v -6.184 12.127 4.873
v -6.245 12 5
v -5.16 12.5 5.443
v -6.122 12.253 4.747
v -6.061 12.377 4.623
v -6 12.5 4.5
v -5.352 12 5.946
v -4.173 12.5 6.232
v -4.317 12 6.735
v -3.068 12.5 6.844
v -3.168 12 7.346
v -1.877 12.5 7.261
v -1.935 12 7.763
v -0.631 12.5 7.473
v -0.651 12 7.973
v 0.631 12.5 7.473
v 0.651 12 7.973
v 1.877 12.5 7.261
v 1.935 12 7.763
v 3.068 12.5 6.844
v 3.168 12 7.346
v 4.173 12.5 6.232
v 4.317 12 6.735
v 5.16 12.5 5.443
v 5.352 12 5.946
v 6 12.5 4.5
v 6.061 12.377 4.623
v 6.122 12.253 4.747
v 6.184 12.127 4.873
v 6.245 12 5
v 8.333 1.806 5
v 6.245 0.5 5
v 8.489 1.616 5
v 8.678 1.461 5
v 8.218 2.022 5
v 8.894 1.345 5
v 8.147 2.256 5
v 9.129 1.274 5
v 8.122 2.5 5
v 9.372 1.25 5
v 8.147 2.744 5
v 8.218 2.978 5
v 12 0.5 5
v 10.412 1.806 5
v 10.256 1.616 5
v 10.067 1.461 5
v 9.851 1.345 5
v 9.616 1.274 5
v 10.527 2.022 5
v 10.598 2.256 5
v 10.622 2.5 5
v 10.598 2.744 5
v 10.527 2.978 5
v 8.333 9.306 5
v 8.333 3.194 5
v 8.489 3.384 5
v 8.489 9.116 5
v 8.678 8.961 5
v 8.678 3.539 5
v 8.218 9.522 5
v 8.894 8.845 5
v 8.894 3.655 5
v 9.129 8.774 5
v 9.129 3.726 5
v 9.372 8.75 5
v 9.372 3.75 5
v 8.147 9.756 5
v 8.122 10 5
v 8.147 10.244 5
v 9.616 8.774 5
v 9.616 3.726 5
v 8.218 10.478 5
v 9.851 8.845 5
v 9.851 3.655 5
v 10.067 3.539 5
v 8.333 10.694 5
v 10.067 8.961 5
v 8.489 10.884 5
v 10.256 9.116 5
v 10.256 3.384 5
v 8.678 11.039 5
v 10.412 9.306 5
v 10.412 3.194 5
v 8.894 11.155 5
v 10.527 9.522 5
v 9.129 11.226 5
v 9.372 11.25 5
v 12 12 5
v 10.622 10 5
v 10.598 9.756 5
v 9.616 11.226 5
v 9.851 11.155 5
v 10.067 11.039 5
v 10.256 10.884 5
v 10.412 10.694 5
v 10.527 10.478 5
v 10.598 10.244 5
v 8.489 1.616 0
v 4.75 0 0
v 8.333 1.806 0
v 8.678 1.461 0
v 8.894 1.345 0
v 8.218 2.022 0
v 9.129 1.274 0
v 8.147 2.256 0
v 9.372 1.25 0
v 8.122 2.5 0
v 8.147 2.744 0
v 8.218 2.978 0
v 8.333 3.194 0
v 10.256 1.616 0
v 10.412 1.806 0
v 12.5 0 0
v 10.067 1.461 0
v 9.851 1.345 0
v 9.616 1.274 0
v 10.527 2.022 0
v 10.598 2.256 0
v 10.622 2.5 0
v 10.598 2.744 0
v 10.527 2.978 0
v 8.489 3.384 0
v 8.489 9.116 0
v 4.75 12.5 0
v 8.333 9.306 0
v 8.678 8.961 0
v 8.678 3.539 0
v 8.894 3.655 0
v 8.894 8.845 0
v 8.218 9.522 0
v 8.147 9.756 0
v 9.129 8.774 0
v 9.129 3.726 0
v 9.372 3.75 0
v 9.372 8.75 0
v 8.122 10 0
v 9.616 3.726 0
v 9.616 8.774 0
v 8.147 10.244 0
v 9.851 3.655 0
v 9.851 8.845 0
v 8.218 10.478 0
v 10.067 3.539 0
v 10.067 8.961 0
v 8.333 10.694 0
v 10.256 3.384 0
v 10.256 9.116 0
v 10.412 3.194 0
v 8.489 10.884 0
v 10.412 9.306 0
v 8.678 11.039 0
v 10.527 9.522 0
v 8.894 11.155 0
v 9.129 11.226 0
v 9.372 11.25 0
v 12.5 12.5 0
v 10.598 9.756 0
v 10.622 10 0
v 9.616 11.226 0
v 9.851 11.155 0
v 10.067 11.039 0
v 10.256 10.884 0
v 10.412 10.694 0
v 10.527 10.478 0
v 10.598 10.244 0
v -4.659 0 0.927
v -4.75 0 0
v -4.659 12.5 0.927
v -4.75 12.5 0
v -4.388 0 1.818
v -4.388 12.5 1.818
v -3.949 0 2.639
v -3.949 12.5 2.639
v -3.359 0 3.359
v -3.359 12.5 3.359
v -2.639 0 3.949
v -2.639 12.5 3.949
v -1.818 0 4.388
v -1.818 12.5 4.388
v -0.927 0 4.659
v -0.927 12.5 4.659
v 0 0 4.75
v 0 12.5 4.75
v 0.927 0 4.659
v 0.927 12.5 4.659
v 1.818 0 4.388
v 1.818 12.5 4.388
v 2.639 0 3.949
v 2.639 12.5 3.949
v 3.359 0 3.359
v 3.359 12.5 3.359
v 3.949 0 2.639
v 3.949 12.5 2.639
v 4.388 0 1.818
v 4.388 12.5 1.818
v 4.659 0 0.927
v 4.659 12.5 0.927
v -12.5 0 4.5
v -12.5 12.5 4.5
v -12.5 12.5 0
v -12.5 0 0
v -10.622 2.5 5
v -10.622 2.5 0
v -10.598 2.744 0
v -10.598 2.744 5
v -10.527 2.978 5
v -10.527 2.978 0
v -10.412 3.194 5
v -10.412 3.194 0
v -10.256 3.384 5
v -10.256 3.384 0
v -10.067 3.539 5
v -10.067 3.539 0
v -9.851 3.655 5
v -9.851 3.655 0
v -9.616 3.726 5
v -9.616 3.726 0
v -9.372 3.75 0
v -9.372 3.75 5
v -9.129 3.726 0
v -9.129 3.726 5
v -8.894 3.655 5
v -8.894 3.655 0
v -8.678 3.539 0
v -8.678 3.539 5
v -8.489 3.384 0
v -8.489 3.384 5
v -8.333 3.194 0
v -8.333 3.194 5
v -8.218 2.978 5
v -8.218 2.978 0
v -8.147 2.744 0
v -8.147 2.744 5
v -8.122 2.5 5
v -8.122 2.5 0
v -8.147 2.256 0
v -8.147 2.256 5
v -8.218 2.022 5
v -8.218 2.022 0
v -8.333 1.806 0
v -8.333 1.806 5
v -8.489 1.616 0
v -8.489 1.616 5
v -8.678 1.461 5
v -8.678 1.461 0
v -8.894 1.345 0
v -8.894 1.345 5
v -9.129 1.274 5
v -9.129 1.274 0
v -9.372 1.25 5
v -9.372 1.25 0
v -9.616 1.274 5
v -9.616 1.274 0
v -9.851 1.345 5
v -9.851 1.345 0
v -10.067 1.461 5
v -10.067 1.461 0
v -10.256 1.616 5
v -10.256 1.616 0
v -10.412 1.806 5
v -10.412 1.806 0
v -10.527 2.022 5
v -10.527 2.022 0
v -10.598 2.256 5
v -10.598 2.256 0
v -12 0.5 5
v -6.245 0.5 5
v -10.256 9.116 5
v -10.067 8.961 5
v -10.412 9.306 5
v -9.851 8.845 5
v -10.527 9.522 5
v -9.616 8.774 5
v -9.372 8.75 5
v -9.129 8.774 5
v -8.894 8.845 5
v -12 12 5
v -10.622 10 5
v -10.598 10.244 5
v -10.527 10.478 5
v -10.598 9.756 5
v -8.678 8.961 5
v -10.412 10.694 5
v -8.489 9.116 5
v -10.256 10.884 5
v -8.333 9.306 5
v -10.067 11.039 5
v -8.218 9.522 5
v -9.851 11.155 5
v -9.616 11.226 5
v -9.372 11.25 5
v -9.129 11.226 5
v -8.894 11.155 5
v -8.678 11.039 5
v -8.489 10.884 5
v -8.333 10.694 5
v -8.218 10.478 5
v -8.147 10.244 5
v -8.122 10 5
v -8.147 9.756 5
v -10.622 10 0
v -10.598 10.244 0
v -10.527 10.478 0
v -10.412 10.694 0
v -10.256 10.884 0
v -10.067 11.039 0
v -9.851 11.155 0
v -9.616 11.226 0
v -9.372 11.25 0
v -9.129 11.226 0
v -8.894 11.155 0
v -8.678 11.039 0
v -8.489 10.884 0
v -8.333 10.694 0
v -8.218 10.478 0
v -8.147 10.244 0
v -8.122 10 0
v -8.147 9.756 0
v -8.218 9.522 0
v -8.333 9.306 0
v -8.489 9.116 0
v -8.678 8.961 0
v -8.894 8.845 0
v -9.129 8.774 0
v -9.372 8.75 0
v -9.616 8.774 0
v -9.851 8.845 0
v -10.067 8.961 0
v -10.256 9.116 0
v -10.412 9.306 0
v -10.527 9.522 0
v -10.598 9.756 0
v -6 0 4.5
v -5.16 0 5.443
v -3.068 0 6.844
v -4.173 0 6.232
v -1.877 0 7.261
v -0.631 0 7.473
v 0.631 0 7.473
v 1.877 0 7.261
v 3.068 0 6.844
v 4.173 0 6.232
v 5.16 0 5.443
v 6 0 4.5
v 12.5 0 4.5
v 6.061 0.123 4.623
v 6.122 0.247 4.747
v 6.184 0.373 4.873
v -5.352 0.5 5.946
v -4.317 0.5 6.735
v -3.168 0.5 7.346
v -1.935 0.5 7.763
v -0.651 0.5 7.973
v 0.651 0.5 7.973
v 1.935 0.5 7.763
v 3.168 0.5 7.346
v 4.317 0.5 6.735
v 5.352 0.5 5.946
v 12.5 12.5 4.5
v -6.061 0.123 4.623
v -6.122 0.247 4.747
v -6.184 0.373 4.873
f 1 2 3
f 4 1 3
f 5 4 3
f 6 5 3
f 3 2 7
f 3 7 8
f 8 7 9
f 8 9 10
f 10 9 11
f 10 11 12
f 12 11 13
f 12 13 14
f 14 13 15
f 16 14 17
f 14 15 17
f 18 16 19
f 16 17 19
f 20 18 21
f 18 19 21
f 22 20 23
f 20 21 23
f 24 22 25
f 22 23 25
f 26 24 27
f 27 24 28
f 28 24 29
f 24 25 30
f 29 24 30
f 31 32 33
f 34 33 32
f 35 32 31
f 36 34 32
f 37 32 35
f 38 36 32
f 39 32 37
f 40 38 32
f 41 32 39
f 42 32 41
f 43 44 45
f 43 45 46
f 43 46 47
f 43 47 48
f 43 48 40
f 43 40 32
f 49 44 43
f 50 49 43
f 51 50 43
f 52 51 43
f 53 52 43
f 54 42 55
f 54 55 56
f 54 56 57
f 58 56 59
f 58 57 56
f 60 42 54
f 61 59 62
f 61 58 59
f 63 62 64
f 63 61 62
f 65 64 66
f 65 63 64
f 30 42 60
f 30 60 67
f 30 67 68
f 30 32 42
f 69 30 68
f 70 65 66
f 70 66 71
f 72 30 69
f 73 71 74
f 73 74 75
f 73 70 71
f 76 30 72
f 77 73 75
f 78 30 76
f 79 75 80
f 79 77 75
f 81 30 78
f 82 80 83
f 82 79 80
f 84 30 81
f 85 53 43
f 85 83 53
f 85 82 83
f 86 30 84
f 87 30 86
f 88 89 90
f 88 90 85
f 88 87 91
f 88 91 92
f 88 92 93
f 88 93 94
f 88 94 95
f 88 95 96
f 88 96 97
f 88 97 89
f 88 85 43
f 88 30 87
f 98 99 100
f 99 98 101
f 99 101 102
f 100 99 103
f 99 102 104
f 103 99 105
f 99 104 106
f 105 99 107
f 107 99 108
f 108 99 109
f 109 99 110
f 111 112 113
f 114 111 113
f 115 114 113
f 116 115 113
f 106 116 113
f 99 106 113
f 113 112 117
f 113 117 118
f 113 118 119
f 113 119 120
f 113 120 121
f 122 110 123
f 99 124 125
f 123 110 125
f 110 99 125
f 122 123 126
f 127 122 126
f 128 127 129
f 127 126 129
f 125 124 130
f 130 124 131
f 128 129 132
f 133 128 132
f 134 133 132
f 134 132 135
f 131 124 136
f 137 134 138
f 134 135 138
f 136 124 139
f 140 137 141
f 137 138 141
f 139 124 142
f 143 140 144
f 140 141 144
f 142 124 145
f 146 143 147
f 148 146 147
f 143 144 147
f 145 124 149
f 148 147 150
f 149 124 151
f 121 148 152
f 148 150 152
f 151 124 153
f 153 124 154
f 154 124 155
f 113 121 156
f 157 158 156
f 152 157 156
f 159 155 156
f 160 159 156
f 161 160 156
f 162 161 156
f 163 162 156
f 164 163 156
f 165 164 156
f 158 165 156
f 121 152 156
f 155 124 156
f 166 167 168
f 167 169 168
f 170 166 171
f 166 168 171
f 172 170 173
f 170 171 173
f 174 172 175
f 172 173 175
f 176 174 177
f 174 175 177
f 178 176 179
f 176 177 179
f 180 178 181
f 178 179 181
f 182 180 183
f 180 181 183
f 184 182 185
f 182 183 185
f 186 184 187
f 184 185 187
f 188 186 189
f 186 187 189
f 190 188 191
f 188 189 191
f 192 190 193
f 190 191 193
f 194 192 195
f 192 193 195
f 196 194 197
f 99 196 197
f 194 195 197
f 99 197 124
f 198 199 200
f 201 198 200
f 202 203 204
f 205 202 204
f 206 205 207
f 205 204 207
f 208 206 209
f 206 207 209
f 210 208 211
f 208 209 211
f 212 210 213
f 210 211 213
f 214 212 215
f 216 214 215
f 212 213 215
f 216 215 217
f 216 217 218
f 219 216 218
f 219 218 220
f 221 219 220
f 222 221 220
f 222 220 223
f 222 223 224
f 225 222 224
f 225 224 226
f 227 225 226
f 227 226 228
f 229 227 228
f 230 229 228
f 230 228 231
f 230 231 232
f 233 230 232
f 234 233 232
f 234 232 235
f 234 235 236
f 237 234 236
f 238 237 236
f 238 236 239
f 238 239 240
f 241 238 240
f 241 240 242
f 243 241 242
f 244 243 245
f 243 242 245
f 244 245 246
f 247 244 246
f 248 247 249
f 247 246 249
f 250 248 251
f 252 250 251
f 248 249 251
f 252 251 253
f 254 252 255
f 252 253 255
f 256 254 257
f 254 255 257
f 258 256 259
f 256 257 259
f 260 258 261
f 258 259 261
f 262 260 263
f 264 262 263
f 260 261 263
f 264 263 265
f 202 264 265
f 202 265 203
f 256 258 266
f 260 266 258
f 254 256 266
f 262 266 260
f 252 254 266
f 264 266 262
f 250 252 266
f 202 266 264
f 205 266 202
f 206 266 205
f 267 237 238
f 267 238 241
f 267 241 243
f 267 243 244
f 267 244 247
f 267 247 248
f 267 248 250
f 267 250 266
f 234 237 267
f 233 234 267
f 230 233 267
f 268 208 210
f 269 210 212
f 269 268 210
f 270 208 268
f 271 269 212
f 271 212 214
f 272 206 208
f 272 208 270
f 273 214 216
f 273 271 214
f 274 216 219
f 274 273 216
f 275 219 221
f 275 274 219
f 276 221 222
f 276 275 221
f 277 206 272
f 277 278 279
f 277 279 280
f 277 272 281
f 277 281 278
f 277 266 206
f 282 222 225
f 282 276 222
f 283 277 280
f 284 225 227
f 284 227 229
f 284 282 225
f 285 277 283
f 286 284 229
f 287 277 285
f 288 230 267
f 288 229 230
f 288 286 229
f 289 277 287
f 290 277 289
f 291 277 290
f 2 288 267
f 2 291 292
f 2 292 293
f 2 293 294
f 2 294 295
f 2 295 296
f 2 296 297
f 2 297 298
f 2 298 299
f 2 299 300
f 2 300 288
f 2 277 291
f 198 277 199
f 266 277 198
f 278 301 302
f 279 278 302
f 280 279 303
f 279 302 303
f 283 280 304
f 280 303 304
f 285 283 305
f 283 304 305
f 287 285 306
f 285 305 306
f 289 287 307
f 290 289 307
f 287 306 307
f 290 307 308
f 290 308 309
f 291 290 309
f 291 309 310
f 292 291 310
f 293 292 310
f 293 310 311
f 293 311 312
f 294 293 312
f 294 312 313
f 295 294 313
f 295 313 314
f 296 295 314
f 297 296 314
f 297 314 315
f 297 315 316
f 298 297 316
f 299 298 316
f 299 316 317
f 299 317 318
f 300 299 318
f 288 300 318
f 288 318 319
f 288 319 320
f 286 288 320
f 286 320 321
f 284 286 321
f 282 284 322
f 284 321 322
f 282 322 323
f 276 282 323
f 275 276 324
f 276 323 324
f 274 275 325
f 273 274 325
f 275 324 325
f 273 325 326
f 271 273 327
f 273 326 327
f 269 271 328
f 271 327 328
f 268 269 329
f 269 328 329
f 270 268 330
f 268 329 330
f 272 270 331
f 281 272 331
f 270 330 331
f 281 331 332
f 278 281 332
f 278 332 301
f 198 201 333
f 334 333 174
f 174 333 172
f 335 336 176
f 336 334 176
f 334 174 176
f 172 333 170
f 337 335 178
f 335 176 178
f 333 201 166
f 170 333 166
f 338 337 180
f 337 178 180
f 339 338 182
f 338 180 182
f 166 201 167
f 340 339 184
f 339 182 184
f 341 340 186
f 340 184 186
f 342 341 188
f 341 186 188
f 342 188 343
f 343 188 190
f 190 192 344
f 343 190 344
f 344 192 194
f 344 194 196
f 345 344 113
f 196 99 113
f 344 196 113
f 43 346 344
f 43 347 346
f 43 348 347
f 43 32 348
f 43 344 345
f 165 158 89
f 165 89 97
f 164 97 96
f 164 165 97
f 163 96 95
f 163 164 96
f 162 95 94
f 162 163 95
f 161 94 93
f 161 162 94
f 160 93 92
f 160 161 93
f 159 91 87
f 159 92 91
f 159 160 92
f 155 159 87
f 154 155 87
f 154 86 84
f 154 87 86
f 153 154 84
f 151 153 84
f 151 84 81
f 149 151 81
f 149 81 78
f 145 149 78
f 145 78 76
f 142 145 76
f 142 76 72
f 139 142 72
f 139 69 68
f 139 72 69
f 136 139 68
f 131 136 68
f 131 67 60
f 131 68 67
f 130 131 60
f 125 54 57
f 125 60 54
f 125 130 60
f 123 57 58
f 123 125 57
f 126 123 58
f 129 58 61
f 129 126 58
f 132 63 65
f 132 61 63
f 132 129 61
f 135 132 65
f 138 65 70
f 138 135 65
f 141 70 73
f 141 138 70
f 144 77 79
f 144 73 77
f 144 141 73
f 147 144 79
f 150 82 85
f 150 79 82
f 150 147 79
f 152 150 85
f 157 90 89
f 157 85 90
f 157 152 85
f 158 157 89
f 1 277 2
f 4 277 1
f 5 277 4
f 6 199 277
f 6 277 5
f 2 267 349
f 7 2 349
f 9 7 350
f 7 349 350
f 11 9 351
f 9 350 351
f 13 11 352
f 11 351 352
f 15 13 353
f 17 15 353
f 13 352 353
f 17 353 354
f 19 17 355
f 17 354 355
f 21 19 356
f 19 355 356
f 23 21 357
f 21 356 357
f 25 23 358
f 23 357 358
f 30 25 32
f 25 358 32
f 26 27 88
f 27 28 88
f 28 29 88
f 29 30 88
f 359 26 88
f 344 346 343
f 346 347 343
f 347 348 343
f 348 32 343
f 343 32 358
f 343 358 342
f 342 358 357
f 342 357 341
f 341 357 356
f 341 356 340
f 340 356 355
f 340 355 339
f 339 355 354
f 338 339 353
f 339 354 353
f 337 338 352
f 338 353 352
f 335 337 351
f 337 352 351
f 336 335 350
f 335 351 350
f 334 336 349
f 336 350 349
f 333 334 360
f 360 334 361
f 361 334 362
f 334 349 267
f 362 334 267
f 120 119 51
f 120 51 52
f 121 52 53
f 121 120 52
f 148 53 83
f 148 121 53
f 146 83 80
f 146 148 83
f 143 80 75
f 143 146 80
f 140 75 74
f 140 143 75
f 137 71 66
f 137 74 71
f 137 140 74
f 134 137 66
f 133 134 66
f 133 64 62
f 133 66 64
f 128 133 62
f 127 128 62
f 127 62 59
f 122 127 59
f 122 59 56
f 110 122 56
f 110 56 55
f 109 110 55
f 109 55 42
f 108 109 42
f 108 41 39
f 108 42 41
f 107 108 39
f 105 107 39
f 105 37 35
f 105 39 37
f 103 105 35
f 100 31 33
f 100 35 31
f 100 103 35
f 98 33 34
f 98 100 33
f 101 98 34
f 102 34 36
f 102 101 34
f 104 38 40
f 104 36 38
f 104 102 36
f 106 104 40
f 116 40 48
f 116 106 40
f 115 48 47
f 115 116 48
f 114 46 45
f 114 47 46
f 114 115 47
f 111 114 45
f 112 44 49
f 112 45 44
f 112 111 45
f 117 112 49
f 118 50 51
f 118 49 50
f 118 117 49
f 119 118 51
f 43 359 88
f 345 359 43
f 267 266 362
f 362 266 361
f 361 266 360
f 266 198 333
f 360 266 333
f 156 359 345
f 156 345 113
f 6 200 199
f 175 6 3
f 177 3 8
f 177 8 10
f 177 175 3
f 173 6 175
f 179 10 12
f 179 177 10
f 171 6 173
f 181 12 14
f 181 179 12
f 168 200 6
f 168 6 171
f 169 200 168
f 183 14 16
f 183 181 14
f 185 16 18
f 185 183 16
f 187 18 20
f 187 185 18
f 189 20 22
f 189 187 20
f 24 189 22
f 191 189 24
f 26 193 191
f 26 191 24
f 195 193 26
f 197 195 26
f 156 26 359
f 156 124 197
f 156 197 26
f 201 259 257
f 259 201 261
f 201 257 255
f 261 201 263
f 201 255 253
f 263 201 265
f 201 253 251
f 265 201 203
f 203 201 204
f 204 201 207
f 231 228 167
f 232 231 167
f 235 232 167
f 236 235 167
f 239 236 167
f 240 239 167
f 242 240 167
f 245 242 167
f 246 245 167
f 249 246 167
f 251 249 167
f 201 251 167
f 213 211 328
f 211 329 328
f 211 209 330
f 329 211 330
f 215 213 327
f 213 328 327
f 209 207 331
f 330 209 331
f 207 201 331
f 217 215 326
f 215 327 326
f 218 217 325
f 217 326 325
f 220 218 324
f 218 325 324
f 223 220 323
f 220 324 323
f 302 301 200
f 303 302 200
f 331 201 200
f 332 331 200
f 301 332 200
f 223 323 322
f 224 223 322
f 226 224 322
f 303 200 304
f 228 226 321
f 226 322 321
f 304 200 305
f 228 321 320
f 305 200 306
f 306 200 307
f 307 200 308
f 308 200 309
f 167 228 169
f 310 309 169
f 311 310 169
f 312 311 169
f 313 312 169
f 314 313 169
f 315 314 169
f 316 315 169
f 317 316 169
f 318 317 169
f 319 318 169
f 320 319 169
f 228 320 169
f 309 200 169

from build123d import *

# Parameters (mm, degrees)
SKETCH_1_R          = 8
EXTRUDE_1_DEPTH     = 12.5
SKETCH_3_W          = 25
SKETCH_3_H          = 10
EXTRUDE_2_DEPTH     = 12.5
SKETCH_4_R          = 4.75
CUT_EXTRUDE_1_DEPTH = 20.403607912
SKETCH_5_R          = 1.25
CUT_EXTRUDE_2_DEPTH = 22.943108257
CHAMFER_1_SIZE      = 0.5
SKETCH_6_W          = 49.161013252
SKETCH_6_H          = 46.40097955
CUT_EXTRUDE_3_DEPTH = 20.403607912


with BuildPart() as part:
    # 草图1 → 凸台-拉伸1 (new body)
    with BuildSketch(Plane(origin=(0, 0, 0), x_dir=(1, 0, 0), z_dir=(0, 1, 0))):
        with Locations(Location((0, 0, 0), (0, 0, 270))):
            Circle(SKETCH_1_R)
    extrude(amount=EXTRUDE_1_DEPTH)

    # 草图3 → 凸台-拉伸2 (add)
    with BuildSketch(Plane(origin=(0, 12.5, 0), x_dir=(1, 0, 0), z_dir=(0, 1, 0))):
        Rectangle(SKETCH_3_W, SKETCH_3_H)
    extrude(amount=-EXTRUDE_2_DEPTH)

    # 草图4 → 切除-拉伸1 (cut, through all)
    with BuildSketch(Plane(origin=(0, 12.5, 0), x_dir=(1, 0, 0), z_dir=(0, 1, 0))):
        with Locations(Location((0, 0, 0), (0, 0, 270))):
            Circle(SKETCH_4_R)
    extrude(amount=-CUT_EXTRUDE_1_DEPTH, mode=Mode.SUBTRACT)

    # 草图5 → 切除-拉伸2 (cut, through all)
    with BuildSketch(Plane(origin=(0, 0, -5), x_dir=(-1, 0, 0), z_dir=(0, 0, -1))):
        with Locations((9.372498999, 2.5)):
            Circle(SKETCH_5_R)
        with Locations((9.372498999, 10)):
            Circle(SKETCH_5_R)
    cut_extrude_2 = extrude(amount=-CUT_EXTRUDE_2_DEPTH, mode=Mode.SUBTRACT)

    # 镜向1: 切除-拉伸2 across plane
    add(cut_extrude_2.mirror(Plane(origin=(0, 0, 0), x_dir=(0, 0, 1), z_dir=(1, 0, 0))), mode=Mode.SUBTRACT)

    # 倒角1
    chamfer_1_edges = [part.edges().sort_by_distance(p)[0] for p in [
        (9.372498999, 12.5, -5),
        (9.372498999, 12.5, 5),
        (9.372498999, 0, 5),
        (9.372498999, 0, -5),
        (-12.5, 6.25, -5),
        (12.5, 6.25, 5),
        (-12.5, 6.25, 5),
        (12.5, 6.25, -5),
        (-9.372498999, 12.5, 5),
        (-9.372498999, 12.5, -5),
        (-9.372498999, 0, -5),
        (-9.372498999, 0, 5),
        (0, 0, -8),
        (0, 0, 8),
        (0, 12.5, -8),
        (0, 12.5, 8),
    ]]
    chamfer(chamfer_1_edges, length=CHAMFER_1_SIZE)

    # 草图6 → 切除-拉伸3 (cut, through all)
    with BuildSketch(Plane.XY):
        Rectangle(SKETCH_6_W, SKETCH_6_H)
    extrude(amount=-CUT_EXTRUDE_3_DEPTH, mode=Mode.SUBTRACT)


solid = part.part
